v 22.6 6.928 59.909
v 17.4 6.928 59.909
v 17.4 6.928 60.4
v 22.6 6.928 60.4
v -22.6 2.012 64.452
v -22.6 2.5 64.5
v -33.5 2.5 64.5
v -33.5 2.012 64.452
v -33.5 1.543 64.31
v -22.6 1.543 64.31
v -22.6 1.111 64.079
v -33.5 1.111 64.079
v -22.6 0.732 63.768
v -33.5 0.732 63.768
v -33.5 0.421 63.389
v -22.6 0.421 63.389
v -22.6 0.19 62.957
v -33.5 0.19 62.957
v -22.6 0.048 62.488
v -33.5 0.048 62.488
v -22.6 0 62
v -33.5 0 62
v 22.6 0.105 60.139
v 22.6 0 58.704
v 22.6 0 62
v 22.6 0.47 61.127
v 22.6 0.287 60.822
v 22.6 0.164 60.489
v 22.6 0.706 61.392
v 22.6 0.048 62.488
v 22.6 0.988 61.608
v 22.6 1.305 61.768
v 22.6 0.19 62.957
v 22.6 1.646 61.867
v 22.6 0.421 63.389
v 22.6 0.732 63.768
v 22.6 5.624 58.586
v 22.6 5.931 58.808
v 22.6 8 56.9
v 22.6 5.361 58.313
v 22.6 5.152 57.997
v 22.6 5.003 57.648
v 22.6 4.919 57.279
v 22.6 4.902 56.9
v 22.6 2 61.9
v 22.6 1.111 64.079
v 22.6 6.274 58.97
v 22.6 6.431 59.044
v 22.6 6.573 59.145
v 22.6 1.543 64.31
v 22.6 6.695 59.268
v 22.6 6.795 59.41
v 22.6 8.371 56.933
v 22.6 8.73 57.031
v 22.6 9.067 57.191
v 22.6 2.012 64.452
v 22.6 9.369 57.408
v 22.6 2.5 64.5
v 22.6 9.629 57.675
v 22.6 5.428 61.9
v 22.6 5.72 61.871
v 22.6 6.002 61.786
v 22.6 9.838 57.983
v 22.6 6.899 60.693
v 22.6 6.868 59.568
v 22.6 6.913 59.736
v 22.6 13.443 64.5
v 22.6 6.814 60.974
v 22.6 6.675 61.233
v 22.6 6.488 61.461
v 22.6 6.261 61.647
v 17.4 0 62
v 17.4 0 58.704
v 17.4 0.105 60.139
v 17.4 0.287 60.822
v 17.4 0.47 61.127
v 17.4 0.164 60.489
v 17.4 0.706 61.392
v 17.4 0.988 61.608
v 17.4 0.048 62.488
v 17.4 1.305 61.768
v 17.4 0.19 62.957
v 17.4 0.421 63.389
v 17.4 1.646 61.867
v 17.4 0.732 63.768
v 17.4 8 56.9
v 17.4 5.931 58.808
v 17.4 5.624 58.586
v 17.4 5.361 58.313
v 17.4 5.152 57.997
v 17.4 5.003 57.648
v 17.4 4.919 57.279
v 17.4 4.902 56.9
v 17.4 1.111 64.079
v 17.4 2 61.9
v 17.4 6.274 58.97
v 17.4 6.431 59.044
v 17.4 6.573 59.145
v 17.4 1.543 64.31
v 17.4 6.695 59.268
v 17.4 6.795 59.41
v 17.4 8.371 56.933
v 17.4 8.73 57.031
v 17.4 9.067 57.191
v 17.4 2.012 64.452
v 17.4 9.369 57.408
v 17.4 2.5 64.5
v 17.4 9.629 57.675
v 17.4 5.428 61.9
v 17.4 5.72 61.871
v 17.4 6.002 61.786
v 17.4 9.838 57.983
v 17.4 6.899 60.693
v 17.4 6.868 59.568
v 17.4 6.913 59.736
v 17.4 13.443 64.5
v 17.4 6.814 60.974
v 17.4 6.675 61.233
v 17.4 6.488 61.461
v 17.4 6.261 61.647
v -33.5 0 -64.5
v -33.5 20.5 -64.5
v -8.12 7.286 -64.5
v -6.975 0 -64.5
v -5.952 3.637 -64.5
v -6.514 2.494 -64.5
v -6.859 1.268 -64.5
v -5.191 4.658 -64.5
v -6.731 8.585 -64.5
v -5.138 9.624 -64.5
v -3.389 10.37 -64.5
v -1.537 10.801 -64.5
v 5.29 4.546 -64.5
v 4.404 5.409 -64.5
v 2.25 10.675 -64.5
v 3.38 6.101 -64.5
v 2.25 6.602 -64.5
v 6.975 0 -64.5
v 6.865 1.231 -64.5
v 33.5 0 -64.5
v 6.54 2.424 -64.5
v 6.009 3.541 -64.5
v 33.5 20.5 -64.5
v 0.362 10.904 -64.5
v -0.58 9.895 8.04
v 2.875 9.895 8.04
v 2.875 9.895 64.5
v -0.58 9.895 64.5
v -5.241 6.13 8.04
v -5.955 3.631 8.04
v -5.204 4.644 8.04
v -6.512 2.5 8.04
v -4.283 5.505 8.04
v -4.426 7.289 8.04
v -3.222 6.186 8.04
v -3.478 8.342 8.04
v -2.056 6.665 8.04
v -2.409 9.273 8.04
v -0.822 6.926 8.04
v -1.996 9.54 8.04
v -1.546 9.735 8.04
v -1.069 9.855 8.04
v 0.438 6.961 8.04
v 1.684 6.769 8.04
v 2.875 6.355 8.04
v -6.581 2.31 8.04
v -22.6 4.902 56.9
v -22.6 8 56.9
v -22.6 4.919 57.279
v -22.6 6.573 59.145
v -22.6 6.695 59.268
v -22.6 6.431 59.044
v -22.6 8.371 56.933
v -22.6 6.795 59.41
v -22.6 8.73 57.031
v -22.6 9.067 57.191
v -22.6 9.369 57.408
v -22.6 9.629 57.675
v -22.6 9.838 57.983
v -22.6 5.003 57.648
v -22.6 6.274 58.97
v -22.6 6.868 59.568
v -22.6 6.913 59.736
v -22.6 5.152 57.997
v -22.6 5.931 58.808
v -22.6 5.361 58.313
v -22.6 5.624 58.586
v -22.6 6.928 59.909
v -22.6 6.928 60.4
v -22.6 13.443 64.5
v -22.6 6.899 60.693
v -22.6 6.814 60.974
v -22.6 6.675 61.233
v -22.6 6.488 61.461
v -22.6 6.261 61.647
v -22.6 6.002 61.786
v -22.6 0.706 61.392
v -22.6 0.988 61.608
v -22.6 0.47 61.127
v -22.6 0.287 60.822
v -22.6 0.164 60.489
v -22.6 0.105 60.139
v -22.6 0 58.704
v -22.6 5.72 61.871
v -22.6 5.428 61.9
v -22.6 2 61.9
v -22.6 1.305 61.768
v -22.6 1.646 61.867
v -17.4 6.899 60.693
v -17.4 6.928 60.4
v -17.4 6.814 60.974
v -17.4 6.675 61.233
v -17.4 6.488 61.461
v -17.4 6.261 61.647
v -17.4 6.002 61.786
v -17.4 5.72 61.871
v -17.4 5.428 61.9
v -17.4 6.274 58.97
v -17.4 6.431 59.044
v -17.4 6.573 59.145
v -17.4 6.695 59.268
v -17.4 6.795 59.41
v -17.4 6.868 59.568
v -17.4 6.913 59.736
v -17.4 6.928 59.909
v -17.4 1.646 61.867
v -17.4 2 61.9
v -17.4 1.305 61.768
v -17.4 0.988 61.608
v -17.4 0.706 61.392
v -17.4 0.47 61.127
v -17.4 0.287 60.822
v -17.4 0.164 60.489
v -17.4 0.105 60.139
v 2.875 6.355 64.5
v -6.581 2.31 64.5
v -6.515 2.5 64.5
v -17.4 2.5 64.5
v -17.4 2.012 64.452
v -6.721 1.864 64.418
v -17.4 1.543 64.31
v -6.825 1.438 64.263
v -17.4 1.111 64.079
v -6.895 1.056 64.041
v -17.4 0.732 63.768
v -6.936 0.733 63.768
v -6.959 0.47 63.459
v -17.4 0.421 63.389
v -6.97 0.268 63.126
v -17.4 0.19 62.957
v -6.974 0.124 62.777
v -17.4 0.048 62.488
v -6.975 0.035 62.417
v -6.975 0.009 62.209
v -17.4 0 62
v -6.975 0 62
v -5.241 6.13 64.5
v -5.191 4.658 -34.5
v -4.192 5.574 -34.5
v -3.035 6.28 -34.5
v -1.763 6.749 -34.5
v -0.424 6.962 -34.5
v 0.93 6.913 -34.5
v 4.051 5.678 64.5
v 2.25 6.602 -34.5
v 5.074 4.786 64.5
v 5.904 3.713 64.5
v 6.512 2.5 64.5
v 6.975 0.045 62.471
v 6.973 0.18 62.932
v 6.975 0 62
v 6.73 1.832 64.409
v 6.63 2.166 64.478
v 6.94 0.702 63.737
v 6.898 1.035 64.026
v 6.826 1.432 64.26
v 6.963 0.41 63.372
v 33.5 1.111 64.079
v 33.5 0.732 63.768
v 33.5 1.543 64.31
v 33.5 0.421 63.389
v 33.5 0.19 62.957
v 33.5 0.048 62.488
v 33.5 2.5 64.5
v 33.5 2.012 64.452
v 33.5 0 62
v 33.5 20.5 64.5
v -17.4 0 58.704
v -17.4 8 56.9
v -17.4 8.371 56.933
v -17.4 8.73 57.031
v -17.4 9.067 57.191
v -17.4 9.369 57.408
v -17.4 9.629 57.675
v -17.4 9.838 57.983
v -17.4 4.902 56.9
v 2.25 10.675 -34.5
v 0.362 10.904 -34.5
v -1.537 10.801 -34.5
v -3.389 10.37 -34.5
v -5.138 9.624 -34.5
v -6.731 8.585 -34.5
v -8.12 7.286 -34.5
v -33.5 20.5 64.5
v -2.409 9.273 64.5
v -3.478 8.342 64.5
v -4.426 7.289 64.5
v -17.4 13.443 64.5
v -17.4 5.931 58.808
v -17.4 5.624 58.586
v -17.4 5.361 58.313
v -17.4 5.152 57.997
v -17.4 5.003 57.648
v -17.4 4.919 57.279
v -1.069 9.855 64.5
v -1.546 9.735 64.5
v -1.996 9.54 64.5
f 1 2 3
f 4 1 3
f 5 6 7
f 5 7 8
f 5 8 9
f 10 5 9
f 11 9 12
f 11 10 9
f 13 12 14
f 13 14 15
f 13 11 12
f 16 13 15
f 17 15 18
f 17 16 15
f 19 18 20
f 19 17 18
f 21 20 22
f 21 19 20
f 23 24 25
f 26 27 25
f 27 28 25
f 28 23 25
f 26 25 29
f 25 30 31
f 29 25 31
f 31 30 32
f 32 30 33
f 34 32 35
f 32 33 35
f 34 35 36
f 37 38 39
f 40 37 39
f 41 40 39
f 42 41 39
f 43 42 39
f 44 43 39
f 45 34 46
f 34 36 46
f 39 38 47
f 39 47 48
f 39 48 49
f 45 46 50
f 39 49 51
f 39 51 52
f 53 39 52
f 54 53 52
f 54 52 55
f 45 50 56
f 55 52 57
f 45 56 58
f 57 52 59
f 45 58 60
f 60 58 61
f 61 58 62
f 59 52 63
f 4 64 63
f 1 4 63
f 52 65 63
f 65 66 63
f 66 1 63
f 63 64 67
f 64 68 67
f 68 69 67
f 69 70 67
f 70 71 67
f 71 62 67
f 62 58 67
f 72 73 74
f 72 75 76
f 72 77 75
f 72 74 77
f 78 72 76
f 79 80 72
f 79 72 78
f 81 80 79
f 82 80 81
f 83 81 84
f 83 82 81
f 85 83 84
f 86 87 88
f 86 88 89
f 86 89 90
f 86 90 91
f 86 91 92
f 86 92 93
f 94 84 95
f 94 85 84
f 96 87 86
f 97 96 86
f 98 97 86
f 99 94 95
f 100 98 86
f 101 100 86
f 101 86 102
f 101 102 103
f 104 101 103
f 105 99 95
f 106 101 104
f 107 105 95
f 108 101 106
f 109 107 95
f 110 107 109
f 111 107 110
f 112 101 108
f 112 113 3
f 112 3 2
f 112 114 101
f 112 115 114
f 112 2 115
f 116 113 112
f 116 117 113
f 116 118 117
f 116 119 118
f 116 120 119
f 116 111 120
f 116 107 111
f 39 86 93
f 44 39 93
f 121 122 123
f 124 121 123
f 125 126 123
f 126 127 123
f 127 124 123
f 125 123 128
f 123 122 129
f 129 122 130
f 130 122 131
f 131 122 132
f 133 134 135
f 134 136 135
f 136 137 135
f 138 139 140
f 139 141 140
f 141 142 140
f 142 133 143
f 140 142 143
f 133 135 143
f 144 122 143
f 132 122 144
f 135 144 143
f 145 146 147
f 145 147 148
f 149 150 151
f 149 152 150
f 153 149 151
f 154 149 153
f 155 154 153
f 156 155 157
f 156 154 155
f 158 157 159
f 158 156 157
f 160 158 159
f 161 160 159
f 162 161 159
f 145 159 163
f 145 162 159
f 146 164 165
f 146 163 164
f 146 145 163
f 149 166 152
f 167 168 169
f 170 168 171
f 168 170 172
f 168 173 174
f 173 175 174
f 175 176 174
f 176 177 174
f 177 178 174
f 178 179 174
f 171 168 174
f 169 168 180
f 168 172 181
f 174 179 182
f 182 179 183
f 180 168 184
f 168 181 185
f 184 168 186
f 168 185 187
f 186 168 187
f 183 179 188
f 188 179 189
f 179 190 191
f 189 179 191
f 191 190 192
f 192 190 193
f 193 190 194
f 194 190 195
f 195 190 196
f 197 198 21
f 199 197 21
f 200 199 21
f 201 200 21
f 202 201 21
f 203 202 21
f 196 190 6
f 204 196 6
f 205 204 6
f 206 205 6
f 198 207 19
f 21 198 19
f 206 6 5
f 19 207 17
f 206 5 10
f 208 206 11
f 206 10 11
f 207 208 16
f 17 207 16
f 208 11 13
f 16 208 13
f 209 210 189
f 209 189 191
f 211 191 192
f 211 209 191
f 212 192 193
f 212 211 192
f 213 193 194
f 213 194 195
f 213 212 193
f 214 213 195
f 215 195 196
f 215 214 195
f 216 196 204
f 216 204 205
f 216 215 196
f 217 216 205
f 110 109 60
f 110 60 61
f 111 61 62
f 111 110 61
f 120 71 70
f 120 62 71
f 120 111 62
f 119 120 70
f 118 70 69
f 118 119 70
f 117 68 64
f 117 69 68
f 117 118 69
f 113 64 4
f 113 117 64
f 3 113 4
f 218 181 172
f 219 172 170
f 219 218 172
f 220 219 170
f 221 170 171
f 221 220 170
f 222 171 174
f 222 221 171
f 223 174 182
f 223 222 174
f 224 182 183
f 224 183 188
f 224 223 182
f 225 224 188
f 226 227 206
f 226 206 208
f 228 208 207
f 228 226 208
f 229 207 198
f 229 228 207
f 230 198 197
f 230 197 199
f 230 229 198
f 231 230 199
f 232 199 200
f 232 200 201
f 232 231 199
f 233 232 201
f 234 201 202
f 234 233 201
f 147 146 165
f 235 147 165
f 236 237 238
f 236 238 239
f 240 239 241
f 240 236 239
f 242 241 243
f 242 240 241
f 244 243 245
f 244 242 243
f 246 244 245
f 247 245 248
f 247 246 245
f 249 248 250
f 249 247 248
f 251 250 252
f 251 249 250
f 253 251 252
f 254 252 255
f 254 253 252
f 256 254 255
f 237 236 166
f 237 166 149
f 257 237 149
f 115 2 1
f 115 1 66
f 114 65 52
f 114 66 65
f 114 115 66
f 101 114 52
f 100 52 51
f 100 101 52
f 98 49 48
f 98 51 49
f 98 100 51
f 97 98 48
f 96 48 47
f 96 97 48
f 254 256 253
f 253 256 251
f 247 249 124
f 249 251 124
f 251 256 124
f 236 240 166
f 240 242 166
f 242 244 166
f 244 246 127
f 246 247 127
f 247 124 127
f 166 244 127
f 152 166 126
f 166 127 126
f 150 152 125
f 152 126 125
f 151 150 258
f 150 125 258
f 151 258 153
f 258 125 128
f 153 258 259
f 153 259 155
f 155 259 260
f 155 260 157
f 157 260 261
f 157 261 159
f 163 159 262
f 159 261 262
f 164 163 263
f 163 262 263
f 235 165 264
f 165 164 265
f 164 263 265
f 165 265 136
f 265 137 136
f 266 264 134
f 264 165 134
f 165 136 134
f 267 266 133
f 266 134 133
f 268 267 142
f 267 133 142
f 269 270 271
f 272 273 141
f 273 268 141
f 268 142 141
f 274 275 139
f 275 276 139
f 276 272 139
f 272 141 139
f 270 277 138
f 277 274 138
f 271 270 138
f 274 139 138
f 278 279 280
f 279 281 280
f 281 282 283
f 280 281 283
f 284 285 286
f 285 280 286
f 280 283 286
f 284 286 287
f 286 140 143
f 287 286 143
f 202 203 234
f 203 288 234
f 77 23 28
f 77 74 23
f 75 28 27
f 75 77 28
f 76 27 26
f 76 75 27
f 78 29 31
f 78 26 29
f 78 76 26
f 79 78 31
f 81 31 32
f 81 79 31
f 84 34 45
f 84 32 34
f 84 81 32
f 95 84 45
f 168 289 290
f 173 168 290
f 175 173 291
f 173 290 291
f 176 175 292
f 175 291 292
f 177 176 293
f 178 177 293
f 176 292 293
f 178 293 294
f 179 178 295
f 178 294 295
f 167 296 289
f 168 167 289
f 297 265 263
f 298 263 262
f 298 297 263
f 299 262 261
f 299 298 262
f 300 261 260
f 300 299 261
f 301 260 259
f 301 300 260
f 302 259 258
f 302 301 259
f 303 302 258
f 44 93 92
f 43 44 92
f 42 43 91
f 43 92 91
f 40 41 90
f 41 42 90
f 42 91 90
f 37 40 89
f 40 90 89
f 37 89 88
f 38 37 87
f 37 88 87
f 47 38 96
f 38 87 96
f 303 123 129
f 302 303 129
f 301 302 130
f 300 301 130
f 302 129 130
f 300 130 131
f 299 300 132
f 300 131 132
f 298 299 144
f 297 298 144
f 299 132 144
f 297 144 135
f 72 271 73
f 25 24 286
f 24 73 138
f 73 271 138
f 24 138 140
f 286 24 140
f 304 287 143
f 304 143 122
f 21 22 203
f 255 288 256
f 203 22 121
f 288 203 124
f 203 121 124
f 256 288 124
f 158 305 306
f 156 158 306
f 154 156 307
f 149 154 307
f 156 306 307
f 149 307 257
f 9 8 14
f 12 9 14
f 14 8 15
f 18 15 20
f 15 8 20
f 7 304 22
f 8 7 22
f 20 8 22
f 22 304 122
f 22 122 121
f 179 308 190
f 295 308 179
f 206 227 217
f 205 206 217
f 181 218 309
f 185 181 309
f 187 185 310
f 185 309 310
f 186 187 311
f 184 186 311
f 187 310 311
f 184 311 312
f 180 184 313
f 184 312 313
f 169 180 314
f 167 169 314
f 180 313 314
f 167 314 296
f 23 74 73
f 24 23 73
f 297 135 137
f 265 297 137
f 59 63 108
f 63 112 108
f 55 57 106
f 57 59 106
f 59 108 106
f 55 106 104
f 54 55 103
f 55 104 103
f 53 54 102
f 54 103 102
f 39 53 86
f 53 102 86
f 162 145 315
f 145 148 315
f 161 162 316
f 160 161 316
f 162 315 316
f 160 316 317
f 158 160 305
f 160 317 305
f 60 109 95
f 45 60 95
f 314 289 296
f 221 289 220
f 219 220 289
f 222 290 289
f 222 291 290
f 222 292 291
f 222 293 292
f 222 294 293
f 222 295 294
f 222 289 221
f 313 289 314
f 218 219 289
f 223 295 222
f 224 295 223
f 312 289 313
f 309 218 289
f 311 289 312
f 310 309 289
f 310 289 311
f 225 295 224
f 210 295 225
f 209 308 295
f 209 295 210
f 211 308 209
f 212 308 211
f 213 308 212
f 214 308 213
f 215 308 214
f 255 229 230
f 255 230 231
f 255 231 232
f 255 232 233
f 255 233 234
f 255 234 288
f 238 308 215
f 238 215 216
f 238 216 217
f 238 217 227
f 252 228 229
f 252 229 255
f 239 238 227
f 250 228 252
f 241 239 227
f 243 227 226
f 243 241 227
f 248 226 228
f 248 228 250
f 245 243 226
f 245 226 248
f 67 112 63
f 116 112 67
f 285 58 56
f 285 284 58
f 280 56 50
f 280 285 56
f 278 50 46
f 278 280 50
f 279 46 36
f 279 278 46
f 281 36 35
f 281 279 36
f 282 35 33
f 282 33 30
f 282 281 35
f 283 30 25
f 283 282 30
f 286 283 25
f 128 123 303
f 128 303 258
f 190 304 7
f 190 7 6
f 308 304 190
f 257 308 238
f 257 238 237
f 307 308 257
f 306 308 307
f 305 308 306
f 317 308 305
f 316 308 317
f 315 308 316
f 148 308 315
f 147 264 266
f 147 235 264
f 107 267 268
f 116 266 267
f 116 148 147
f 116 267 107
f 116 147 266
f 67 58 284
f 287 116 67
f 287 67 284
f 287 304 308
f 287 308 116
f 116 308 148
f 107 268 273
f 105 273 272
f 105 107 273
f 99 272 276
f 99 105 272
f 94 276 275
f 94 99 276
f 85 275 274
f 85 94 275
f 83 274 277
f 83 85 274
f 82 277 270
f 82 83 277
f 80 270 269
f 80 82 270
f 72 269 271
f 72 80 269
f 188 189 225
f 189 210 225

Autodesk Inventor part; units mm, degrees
ref_plane "XZ Plane" through (0, 0, 0) normal (0, 1, 0) x (-1, 0, 0)
ref_plane "XY Plane" through (0, 0, 0) normal (0, 0, 1) x (1, 0, 0)
sketch "Sketch1" plane through (0, 0, 0) normal (0, 0, 1) x (1, 0, 0)
  line L0 (0, 0) -> (0, 44.0101) construction
  line L1 (-33.5, 0) -> (-6.975, 0)
  line L2 (6.975, 0) -> (33.5, 0)
  arc A0 (6.975, 0) -> (-6.975, 0) centre (0, 0) ccw
  line L3 (33.5, 0) -> (33.5, 20.5)
  line L4 (33.5, 20.5) -> (-33.5, 20.5)
  line L5 (-33.5, 20.5) -> (-33.5, 0)
ref_plane "Work Plane1" through (20, 0, 0) normal (1, 0, 0) x (0, 1, 0)
extrude "Extrusion3" add sketch "Sketch1" along normal mid plane 129
sketch "Sketch4" plane through (20, 0, 0) normal (1, 0, 0) x (0, 1, 0)
  line L0 (0, 64.5) -> (0, -64.5) projected
  line L1 (2, 64.6) -> (10.1, 64.6)
  arc A0 (8, 56.9) -> (9.8375, 57.9834) centre (8, 59) ccw
  line L2 (8, 56.9) -> (4.9024, 56.9)
  arc A1 (6.2736, 58.9704) -> (4.9024, 56.9) centre (7, 57) ccw
  line L3 (6.9278, 59.9087) -> (6.9278, 60.4)
  line L4 (5.4278, 61.9) -> (2, 61.9)
  arc A2 (2, 61.9) -> (0.1051, 60.1387) centre (2, 60) ccw
  line L5 (0.1051, 60.1387) -> (0, 58.7036)
  line L6 (0, 62.6) -> (0, 58.7036)
  line L7 (0, -64.5) -> (0, 64.5) projected
  arc A3 (2, 64.6) -> (0, 62.6) centre (2, 62.6) ccw
  arc A4 (6.9278, 60.4) -> (5.4278, 61.9) centre (5.4278, 60.4) ccw
  line L8 (9.8375, 57.9834) -> (13.4982, 64.6)
  line L9 (13.4982, 64.6) -> (10.1, 64.6)
  arc A5 (6.2736, 58.9704) -> (6.9278, 59.9087) centre (5.9278, 59.9087) ccw
  point P0 (0, 0)
  point P1 (0, 64.6)
  point P2 (8, 64.6)
  point P3 (10.1, 62.5)
  point P4 (6.9278, 59.0988)
  point P5 (6.9278, 61.9)
  point P6 (0, 62.6)
  dimension "d33" = 2
  dimension "d34" = 1.5
  dimension "d35" = 1
extrude "Extrusion4" cut sketch "Sketch4" along normal mid plane 5.2
mirror "Mirror2" about plane through (0, 0, 0) normal (1, 0, 0) of "Extrusion4"
sketch "Sketch5" plane through (33.5, 0, 64.5) normal (1, 0, 0) x (0, 0, -1)
  line L0 (1.9, 0) -> (5.7964, 0) projected
  arc A0 (0, 2.5) -> (2.5, 0) centre (2.5, 2.5) ccw
  line L1 (2.5, 2.5) -> (2.5, 0) construction
  line L2 (2.5, 2.5) -> (5, 2.5) construction
  line L3 (2.5, 2.5) -> (0, 2.5) construction
  line L4 (0, 0) -> (0, 20.5) projected
  line L5 (0, 2.5) -> (0, 0)
  line L6 (0, 0) -> (129, 0) projected
  point P0 (64.5, 0)
  dimension "d36" = 90
  dimension "d37" = 90
  dimension "d38" = 2.5
extrude "Extrusion5" cut sketch "Sketch5" against normal through all
sketch "Sketch6" plane through (0, 0, 64.5) normal (0, 0, 1) x (1, 0, 0)
  arc A0 (6.5116, 2.5) -> (-6.5116, 2.5) centre (0, 0) ccw projected
  line L0 (0, 6.975) -> (2.875, 6.975) construction
  line L1 (2.875, 6.975) -> (2.875, 9.895) construction
  line L2 (-17.4, 0) -> (-6.975, 0) projected
  line L3 (2.875, 9.895) -> (2.875, 6.3549)
  spline S0 degree 6 poles (-6.5116, 2.5) (-6.5776, 2.3279) (-6.6388, 2.1522) (-6.6938, 1.976) (-6.7418, 1.8023) (-6.7828, 1.6341) (-6.8262, 1.4334) (-6.8346, 1.3932) (-6.8426, 1.3535) (-6.8502, 1.3144) (-6.8574, 1.2759) (-6.8768, 1.1683) (-6.8881, 1.1008) (-6.8982, 1.0356) (-6.9073, 0.9727) (-6.9153, 0.9122) (-6.9314, 0.7817) (-6.939, 0.7131) (-6.9453, 0.6483) (-6.9506, 0.5874) (-6.955, 0.5303) (-6.9696, 0.3178) (-6.9738, 0.1923) (-6.9749, 0.099) (-6.975, 0.0363) (-6.975, 0.0034) (-6.975, 0.0002) knots 0 0 0 0 0 0 0 0.246271 0.246271 0.246271 0.246271 0.246271 0.309061 0.309061 0.309061 0.309061 0.309061 0.424616 0.424616 0.424616 0.424616 0.424616 0.569008 0.569008 0.569008 0.569008 0.569008 1 1 1 1 1 1 1 projected
  line L4 (2.875, 9.895) -> (-0.5799, 9.895)
  line L5 (-2.875, 9.895) -> (-2.875, 8.895) construction
  arc A1 (-2.409, 9.2729) -> (-5.2406, 6.1296) centre (4.7239, 0) ccw
  arc A2 (-0.5799, 9.895) -> (-2.409, 9.2729) centre (-0.5799, 6.895) ccw
  line L6 (-6.5813, 2.3101) -> (-5.2406, 6.1296)
  point P0 (-1.5174, 9.895)
  dimension "d41" = 2.875
  dimension "d42" = 2.92
  dimension "d50" = 5.75
  dimension "d52" = 3
sketch "Sketch7" plane through (0, 0, -64.5) normal (0, 0, -1) x (-1, 0, 0)
  arc A0 (6.975, 0) -> (-6.975, 0) centre (0, 0) ccw construction
  line L0 (0, 6.975) -> (-2.25, 6.975) construction
  line L1 (-2.25, 6.975) -> (-2.25, 10.675) construction
  arc A1 (8.1198, 7.2861) -> (-2.25, 10.675) centre (0, 0) ccw
  line L2 (0, 0) -> (8.1198, 7.2861) construction
  line L3 (0, 0) -> (-2.25, 10.675) construction
  line L4 (-2.25, 10.675) -> (-2.25, 6.6021)
  line L5 (8.1198, 7.2861) -> (5.1914, 4.6583)
  arc A2 (5.1914, 4.6583) -> (-2.25, 6.6021) centre (0, 0) ccw
  dimension "d45" = 2.25
  dimension "d46" = 3.7
  dimension "d47" = 60
extrude "Extrusion7" cut sketch "Sketch7" against normal blind 30
extrude "Extrusion8" cut sketch "Sketch6" against normal blind 56.46
properties part number "Laser_Pen_Housing_Top"
